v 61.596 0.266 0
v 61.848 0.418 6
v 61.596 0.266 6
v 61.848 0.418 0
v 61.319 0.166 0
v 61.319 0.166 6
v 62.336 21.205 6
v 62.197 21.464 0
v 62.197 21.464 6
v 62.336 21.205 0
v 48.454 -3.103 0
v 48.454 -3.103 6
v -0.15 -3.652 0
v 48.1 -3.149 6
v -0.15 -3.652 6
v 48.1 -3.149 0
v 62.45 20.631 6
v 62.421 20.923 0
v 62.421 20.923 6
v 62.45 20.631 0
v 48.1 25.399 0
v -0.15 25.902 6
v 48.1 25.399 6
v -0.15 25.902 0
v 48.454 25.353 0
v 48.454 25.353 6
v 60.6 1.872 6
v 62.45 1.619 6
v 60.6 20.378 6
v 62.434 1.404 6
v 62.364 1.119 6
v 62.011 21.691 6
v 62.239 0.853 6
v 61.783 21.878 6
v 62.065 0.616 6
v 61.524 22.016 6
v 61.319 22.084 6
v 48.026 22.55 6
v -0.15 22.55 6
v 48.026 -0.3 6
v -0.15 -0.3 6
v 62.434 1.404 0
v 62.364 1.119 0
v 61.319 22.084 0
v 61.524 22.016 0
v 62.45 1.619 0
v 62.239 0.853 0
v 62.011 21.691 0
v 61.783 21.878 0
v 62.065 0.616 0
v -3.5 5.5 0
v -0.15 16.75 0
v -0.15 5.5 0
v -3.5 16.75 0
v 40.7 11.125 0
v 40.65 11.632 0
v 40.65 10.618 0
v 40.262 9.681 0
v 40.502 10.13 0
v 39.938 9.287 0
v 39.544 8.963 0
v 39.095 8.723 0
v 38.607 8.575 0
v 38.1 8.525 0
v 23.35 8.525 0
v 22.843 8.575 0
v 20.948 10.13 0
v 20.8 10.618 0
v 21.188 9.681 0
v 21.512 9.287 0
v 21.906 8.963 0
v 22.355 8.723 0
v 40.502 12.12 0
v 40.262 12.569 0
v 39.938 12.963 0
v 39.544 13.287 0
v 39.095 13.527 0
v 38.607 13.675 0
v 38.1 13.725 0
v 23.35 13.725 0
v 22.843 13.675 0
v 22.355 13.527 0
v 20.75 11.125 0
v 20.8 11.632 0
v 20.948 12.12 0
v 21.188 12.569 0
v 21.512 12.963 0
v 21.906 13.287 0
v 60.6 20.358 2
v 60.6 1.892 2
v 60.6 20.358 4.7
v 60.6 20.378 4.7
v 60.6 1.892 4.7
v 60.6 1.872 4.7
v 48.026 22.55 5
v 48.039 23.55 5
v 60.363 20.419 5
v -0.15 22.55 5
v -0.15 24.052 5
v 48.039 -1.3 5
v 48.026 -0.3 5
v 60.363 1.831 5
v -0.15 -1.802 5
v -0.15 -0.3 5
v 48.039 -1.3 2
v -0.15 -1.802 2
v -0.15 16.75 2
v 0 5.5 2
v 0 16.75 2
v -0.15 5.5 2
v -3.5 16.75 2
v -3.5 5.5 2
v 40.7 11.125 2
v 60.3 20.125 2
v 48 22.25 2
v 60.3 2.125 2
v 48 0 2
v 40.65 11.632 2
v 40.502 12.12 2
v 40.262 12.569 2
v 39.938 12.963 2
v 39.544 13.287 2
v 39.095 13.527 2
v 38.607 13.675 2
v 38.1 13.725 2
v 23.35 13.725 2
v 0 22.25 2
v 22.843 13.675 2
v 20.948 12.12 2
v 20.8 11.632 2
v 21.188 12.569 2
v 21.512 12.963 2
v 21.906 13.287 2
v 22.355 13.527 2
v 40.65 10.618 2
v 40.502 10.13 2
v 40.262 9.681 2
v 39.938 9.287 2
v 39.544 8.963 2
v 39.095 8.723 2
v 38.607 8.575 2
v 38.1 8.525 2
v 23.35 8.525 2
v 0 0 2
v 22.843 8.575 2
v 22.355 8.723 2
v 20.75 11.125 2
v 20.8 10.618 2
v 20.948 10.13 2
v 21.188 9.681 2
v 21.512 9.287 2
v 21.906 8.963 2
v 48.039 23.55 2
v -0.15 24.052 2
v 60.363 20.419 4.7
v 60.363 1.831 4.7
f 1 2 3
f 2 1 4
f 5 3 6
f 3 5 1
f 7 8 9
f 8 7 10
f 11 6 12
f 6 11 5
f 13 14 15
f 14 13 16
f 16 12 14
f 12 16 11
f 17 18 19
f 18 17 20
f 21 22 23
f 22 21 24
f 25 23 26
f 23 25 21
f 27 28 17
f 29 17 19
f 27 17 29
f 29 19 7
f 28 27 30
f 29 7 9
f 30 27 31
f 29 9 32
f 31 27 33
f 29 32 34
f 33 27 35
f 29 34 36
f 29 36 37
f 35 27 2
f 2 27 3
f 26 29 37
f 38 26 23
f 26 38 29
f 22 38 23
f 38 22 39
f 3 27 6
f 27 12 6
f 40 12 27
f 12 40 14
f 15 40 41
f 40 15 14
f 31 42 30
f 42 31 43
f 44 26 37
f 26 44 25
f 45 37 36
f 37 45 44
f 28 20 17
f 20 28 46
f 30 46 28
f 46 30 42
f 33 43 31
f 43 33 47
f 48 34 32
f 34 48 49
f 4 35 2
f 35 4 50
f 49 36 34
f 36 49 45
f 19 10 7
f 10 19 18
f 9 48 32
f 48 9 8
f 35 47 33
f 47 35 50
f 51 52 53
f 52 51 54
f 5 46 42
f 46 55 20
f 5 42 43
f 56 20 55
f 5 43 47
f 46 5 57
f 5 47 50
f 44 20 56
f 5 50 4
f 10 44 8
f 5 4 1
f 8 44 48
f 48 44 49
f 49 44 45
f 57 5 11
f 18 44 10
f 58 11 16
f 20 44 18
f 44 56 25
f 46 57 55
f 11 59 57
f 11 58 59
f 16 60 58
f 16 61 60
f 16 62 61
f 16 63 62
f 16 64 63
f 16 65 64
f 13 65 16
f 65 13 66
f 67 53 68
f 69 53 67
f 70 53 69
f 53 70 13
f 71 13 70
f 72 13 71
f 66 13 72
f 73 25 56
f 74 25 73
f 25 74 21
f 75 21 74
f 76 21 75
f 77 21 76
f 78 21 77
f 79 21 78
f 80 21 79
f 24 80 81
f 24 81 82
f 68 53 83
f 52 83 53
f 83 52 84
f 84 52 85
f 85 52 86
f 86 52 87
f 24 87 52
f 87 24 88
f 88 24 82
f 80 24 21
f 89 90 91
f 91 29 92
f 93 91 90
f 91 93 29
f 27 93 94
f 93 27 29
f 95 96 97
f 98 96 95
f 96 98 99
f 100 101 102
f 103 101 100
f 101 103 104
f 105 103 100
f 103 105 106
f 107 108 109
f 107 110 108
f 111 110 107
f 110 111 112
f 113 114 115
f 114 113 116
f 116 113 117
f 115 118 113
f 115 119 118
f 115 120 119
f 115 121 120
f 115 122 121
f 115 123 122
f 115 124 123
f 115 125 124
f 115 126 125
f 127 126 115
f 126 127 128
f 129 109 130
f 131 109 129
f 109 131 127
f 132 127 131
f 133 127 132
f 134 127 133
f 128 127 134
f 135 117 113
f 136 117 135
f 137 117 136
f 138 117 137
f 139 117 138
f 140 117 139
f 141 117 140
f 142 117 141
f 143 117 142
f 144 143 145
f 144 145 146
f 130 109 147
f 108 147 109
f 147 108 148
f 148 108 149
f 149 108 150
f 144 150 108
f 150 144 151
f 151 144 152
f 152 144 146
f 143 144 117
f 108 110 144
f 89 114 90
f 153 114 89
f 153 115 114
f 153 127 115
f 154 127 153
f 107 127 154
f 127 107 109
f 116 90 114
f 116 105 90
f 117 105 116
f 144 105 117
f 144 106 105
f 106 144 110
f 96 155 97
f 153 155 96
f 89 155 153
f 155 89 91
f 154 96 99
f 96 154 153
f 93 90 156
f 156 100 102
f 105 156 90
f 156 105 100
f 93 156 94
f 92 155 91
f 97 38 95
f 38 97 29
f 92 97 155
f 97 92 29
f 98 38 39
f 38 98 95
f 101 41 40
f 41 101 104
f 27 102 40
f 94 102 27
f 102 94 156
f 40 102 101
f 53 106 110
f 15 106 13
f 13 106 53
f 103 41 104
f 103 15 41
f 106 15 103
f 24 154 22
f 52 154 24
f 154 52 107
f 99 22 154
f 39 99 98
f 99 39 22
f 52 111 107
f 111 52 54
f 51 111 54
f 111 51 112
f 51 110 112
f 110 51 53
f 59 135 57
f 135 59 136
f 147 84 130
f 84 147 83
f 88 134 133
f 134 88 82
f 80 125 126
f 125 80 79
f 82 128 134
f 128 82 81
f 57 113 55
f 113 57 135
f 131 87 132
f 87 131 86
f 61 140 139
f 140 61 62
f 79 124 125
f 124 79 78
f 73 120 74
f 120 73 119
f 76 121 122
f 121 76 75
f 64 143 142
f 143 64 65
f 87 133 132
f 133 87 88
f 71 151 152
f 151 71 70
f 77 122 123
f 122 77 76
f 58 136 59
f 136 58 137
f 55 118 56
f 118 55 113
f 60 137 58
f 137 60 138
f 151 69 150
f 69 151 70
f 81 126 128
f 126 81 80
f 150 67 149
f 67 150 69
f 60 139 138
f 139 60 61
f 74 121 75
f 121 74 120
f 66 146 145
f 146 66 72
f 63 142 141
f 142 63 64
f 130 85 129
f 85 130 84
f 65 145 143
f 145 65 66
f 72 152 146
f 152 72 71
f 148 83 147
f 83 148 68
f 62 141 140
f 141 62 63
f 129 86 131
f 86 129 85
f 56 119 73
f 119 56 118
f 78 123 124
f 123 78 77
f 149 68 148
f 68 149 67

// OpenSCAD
include <magazine.scad>;

// Render the sliding shoe, nothing else
base_plate();
